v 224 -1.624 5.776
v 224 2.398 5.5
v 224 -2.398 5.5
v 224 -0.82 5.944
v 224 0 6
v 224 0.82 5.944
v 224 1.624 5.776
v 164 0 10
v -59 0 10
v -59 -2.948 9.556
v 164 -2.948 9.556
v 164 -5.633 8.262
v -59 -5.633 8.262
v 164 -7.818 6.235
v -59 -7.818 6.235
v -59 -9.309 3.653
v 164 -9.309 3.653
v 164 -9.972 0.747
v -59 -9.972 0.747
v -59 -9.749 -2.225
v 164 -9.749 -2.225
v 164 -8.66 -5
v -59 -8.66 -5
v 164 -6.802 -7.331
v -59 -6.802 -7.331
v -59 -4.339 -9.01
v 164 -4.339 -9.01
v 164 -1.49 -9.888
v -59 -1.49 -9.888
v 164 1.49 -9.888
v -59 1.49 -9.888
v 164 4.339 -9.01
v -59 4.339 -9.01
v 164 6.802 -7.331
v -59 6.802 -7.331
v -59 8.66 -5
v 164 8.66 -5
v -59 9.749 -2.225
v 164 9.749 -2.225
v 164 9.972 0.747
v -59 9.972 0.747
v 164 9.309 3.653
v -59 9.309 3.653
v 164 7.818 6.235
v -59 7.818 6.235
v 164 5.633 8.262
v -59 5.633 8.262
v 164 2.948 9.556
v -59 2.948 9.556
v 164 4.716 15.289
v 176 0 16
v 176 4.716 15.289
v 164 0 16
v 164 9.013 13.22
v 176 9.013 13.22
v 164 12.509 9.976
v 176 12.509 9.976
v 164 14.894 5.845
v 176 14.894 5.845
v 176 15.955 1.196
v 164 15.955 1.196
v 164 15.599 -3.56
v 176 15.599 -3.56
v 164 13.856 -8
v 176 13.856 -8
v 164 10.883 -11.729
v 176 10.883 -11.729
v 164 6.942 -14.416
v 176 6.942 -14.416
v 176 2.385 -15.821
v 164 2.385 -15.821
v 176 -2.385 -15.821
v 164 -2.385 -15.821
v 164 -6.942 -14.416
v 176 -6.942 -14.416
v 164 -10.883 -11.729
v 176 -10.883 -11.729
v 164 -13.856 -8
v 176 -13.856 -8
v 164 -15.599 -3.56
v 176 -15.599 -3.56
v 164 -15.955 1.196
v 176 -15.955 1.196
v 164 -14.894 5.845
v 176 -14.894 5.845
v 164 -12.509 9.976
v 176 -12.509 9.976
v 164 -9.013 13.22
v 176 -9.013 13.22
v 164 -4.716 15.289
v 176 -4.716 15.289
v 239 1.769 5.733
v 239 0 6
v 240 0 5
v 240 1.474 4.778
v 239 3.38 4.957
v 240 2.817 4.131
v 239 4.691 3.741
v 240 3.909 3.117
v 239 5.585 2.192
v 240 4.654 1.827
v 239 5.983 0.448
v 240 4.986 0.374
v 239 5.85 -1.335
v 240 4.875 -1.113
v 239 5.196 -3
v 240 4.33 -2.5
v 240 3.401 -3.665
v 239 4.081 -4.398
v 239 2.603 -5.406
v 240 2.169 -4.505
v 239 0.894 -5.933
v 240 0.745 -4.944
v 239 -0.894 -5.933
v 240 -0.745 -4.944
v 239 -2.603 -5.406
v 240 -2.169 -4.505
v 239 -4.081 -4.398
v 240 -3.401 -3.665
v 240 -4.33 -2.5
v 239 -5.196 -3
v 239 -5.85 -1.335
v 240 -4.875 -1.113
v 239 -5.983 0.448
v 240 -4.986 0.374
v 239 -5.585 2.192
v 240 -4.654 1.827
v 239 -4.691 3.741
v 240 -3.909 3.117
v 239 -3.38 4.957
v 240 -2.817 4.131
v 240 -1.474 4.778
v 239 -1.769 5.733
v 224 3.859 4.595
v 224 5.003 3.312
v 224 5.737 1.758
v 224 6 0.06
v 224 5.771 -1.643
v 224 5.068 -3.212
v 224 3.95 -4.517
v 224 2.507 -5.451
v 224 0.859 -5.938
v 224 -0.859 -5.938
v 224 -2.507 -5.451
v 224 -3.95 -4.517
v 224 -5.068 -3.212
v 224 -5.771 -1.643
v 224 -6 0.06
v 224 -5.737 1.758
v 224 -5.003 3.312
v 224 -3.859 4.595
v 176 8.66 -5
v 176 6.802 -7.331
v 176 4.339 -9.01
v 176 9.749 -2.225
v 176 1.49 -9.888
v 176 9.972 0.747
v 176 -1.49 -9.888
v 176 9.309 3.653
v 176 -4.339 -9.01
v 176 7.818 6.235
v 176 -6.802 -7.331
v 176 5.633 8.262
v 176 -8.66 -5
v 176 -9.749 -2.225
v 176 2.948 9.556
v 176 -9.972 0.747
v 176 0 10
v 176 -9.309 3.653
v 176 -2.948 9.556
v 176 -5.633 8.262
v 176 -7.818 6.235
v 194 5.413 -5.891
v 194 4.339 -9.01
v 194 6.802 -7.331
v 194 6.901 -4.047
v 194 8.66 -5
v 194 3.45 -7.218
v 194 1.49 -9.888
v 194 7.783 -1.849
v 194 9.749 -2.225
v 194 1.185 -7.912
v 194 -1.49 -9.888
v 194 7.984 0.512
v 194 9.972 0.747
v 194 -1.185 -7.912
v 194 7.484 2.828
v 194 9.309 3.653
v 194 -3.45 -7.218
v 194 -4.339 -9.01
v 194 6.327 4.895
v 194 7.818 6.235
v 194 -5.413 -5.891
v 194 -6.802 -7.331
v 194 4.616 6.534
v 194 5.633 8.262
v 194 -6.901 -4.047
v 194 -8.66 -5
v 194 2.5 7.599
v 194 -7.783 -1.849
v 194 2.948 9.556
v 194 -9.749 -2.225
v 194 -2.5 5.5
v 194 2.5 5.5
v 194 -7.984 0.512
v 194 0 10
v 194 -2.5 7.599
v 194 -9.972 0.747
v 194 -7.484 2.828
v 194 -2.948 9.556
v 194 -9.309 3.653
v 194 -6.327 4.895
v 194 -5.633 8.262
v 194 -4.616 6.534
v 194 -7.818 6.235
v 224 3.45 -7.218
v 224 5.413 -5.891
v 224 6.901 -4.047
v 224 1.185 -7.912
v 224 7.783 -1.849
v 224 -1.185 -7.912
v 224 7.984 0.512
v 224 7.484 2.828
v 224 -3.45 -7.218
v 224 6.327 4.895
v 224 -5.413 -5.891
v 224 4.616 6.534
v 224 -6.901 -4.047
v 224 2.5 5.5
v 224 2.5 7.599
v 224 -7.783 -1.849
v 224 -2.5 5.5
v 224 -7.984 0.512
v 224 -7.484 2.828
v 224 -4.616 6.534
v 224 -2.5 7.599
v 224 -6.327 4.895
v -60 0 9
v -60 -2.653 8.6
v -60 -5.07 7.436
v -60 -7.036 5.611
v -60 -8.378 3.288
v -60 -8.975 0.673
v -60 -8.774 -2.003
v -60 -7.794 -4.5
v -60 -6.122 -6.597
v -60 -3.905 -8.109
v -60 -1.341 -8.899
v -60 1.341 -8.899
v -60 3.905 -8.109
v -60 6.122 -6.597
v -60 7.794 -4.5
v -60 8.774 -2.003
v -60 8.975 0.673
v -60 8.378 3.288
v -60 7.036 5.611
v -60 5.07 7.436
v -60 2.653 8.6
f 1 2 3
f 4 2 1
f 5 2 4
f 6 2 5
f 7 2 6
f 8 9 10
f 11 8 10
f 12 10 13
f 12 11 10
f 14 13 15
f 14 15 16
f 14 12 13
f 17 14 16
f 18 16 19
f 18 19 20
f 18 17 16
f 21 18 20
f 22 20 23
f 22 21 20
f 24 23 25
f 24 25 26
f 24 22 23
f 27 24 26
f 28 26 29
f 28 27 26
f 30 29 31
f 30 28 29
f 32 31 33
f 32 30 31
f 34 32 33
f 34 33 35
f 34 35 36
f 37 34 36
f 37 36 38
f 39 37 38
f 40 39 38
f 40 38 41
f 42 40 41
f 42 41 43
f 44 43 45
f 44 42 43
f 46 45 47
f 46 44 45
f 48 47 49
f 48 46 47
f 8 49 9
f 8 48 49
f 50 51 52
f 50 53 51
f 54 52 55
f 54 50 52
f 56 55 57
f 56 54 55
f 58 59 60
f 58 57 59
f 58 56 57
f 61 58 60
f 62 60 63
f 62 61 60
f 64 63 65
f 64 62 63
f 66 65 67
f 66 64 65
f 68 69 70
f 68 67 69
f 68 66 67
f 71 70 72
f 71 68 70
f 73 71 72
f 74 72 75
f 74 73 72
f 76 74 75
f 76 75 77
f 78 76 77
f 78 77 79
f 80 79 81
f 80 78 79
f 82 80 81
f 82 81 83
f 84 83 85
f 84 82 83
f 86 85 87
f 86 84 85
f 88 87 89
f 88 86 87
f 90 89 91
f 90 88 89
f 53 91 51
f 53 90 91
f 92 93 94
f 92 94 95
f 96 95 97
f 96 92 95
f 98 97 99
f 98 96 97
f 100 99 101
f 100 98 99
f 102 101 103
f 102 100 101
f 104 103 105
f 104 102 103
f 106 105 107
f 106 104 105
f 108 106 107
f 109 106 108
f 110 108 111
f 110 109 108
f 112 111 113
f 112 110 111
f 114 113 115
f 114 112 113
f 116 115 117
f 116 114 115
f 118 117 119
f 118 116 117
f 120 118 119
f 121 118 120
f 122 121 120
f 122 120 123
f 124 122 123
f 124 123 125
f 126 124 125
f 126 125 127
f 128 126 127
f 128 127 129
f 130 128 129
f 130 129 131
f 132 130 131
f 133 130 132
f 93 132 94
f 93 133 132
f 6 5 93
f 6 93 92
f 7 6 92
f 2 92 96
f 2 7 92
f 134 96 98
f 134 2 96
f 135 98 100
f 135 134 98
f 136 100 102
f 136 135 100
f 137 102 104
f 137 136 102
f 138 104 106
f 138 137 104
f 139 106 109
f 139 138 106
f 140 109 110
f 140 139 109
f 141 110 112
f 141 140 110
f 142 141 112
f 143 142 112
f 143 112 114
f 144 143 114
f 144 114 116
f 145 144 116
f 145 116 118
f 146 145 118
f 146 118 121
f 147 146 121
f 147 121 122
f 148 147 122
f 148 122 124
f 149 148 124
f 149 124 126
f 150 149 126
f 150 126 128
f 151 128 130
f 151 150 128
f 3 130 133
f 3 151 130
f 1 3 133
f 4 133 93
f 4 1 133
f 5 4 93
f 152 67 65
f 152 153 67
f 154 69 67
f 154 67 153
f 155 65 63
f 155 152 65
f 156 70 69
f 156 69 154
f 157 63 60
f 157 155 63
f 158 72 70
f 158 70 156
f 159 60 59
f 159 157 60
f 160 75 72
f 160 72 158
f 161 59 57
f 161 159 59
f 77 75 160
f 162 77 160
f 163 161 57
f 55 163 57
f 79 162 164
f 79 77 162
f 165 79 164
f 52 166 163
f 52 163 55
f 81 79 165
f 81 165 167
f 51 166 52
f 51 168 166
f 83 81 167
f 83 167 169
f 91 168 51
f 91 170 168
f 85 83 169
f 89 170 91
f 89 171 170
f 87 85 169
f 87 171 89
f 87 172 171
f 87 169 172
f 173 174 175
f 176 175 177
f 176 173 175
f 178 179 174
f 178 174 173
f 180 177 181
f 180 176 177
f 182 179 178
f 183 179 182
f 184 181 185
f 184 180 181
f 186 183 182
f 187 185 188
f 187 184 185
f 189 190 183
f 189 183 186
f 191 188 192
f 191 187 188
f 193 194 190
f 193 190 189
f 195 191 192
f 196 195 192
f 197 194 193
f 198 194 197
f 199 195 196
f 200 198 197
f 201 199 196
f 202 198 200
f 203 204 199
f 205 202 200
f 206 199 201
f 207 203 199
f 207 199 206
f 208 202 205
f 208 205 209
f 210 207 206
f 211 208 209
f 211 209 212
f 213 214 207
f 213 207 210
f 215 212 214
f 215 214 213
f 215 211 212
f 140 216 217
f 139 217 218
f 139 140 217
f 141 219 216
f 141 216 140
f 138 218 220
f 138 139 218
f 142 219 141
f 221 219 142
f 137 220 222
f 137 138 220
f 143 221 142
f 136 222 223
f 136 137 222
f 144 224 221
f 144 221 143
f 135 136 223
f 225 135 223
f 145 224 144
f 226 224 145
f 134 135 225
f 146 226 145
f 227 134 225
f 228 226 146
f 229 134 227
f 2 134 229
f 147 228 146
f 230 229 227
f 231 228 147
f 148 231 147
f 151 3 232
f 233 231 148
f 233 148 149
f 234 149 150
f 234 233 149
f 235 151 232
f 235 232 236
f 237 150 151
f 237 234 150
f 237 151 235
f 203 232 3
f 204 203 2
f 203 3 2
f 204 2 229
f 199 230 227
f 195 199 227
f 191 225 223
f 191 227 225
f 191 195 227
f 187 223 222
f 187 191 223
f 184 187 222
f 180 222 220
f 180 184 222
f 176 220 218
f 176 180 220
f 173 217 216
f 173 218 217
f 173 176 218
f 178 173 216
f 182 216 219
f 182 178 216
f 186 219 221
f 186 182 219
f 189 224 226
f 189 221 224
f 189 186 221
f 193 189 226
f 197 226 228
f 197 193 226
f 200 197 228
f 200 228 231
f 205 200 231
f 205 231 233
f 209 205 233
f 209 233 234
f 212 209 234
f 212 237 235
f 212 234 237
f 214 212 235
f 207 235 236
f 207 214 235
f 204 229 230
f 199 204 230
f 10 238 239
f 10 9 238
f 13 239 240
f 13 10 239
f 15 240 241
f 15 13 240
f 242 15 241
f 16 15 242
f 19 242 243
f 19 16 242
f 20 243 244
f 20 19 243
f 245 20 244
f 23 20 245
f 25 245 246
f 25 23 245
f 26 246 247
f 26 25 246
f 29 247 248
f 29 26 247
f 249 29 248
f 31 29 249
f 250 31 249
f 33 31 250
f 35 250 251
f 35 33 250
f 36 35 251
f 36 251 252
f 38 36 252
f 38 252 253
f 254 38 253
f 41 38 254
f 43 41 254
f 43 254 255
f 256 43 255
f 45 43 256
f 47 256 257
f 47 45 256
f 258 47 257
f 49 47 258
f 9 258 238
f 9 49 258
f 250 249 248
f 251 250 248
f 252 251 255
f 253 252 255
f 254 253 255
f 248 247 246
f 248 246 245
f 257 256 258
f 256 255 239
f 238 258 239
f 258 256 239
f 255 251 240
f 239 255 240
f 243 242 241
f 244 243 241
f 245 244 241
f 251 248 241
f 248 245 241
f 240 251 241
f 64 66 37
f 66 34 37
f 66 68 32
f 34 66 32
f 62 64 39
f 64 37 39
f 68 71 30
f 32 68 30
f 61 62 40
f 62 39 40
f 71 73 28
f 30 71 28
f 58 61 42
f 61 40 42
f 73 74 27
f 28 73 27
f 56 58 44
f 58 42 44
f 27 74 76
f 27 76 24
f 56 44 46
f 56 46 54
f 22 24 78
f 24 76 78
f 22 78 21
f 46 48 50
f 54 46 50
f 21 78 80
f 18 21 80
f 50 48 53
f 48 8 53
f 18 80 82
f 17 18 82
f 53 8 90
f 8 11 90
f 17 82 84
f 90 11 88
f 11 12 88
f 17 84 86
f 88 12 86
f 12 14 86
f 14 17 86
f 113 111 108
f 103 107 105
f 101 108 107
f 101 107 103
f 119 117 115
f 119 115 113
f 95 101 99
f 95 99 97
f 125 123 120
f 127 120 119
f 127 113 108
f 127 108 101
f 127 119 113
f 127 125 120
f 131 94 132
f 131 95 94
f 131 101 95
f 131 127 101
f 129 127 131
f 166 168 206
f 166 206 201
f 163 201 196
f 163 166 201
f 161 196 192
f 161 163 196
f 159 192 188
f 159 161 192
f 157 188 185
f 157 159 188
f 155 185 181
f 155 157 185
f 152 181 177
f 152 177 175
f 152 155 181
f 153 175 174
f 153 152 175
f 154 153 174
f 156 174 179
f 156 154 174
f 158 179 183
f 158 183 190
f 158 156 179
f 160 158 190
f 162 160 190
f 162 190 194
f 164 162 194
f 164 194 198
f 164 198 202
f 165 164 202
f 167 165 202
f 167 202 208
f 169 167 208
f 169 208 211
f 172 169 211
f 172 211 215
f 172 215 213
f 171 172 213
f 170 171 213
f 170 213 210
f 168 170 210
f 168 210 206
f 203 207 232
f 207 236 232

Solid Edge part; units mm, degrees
sketch "Sketch1" plane through (0, 0, 0) normal (0, -1, 0) x (1, 0, 0)
  line L0 (-60, 0) -> (-60, 9)
  line L1 (-60, 9) -> (-59, 10)
  line L2 (-59, 10) -> (164, 10)
  line L3 (164, 16) -> (164, 10)
  line L4 (176, 16) -> (164, 16)
  line L5 (176, 10) -> (176, 16)
  line L6 (194, 10) -> (176, 10)
  line L7 (194, 8) -> (194, 10)
  line L8 (224, 8) -> (194, 8)
  line L9 (224, 6) -> (224, 8)
  line L10 (239, 6) -> (224, 6)
  line L11 (239, 6) -> (240, 5)
  line L12 (240, 0) -> (240, 5)
revolve "RevolvedProtrusion1" add sketch "Sketch1" angle 360 about axis through (-60, 0, 0) along (1, 0, 0)
cosmetic_thread "Thread1" size "Tr 20 x 4"
cosmetic_thread "Thread2" size "M12"
sketch "Sketch2" plane through (224, 0, 0) normal (1, 0, 0) x (0, 1, 0)
  line L0 (-2.5, 5.5) -> (2.5, 5.5)
  line L1 (2.5, 5.5) -> (2.5, 10.5)
  line L2 (2.5, 10.5) -> (-2.5, 10.5)
  line L3 (-2.5, 10.5) -> (-2.5, 5.5)
extrude "Cutout1" cut sketch "Sketch2" against normal blind 30
